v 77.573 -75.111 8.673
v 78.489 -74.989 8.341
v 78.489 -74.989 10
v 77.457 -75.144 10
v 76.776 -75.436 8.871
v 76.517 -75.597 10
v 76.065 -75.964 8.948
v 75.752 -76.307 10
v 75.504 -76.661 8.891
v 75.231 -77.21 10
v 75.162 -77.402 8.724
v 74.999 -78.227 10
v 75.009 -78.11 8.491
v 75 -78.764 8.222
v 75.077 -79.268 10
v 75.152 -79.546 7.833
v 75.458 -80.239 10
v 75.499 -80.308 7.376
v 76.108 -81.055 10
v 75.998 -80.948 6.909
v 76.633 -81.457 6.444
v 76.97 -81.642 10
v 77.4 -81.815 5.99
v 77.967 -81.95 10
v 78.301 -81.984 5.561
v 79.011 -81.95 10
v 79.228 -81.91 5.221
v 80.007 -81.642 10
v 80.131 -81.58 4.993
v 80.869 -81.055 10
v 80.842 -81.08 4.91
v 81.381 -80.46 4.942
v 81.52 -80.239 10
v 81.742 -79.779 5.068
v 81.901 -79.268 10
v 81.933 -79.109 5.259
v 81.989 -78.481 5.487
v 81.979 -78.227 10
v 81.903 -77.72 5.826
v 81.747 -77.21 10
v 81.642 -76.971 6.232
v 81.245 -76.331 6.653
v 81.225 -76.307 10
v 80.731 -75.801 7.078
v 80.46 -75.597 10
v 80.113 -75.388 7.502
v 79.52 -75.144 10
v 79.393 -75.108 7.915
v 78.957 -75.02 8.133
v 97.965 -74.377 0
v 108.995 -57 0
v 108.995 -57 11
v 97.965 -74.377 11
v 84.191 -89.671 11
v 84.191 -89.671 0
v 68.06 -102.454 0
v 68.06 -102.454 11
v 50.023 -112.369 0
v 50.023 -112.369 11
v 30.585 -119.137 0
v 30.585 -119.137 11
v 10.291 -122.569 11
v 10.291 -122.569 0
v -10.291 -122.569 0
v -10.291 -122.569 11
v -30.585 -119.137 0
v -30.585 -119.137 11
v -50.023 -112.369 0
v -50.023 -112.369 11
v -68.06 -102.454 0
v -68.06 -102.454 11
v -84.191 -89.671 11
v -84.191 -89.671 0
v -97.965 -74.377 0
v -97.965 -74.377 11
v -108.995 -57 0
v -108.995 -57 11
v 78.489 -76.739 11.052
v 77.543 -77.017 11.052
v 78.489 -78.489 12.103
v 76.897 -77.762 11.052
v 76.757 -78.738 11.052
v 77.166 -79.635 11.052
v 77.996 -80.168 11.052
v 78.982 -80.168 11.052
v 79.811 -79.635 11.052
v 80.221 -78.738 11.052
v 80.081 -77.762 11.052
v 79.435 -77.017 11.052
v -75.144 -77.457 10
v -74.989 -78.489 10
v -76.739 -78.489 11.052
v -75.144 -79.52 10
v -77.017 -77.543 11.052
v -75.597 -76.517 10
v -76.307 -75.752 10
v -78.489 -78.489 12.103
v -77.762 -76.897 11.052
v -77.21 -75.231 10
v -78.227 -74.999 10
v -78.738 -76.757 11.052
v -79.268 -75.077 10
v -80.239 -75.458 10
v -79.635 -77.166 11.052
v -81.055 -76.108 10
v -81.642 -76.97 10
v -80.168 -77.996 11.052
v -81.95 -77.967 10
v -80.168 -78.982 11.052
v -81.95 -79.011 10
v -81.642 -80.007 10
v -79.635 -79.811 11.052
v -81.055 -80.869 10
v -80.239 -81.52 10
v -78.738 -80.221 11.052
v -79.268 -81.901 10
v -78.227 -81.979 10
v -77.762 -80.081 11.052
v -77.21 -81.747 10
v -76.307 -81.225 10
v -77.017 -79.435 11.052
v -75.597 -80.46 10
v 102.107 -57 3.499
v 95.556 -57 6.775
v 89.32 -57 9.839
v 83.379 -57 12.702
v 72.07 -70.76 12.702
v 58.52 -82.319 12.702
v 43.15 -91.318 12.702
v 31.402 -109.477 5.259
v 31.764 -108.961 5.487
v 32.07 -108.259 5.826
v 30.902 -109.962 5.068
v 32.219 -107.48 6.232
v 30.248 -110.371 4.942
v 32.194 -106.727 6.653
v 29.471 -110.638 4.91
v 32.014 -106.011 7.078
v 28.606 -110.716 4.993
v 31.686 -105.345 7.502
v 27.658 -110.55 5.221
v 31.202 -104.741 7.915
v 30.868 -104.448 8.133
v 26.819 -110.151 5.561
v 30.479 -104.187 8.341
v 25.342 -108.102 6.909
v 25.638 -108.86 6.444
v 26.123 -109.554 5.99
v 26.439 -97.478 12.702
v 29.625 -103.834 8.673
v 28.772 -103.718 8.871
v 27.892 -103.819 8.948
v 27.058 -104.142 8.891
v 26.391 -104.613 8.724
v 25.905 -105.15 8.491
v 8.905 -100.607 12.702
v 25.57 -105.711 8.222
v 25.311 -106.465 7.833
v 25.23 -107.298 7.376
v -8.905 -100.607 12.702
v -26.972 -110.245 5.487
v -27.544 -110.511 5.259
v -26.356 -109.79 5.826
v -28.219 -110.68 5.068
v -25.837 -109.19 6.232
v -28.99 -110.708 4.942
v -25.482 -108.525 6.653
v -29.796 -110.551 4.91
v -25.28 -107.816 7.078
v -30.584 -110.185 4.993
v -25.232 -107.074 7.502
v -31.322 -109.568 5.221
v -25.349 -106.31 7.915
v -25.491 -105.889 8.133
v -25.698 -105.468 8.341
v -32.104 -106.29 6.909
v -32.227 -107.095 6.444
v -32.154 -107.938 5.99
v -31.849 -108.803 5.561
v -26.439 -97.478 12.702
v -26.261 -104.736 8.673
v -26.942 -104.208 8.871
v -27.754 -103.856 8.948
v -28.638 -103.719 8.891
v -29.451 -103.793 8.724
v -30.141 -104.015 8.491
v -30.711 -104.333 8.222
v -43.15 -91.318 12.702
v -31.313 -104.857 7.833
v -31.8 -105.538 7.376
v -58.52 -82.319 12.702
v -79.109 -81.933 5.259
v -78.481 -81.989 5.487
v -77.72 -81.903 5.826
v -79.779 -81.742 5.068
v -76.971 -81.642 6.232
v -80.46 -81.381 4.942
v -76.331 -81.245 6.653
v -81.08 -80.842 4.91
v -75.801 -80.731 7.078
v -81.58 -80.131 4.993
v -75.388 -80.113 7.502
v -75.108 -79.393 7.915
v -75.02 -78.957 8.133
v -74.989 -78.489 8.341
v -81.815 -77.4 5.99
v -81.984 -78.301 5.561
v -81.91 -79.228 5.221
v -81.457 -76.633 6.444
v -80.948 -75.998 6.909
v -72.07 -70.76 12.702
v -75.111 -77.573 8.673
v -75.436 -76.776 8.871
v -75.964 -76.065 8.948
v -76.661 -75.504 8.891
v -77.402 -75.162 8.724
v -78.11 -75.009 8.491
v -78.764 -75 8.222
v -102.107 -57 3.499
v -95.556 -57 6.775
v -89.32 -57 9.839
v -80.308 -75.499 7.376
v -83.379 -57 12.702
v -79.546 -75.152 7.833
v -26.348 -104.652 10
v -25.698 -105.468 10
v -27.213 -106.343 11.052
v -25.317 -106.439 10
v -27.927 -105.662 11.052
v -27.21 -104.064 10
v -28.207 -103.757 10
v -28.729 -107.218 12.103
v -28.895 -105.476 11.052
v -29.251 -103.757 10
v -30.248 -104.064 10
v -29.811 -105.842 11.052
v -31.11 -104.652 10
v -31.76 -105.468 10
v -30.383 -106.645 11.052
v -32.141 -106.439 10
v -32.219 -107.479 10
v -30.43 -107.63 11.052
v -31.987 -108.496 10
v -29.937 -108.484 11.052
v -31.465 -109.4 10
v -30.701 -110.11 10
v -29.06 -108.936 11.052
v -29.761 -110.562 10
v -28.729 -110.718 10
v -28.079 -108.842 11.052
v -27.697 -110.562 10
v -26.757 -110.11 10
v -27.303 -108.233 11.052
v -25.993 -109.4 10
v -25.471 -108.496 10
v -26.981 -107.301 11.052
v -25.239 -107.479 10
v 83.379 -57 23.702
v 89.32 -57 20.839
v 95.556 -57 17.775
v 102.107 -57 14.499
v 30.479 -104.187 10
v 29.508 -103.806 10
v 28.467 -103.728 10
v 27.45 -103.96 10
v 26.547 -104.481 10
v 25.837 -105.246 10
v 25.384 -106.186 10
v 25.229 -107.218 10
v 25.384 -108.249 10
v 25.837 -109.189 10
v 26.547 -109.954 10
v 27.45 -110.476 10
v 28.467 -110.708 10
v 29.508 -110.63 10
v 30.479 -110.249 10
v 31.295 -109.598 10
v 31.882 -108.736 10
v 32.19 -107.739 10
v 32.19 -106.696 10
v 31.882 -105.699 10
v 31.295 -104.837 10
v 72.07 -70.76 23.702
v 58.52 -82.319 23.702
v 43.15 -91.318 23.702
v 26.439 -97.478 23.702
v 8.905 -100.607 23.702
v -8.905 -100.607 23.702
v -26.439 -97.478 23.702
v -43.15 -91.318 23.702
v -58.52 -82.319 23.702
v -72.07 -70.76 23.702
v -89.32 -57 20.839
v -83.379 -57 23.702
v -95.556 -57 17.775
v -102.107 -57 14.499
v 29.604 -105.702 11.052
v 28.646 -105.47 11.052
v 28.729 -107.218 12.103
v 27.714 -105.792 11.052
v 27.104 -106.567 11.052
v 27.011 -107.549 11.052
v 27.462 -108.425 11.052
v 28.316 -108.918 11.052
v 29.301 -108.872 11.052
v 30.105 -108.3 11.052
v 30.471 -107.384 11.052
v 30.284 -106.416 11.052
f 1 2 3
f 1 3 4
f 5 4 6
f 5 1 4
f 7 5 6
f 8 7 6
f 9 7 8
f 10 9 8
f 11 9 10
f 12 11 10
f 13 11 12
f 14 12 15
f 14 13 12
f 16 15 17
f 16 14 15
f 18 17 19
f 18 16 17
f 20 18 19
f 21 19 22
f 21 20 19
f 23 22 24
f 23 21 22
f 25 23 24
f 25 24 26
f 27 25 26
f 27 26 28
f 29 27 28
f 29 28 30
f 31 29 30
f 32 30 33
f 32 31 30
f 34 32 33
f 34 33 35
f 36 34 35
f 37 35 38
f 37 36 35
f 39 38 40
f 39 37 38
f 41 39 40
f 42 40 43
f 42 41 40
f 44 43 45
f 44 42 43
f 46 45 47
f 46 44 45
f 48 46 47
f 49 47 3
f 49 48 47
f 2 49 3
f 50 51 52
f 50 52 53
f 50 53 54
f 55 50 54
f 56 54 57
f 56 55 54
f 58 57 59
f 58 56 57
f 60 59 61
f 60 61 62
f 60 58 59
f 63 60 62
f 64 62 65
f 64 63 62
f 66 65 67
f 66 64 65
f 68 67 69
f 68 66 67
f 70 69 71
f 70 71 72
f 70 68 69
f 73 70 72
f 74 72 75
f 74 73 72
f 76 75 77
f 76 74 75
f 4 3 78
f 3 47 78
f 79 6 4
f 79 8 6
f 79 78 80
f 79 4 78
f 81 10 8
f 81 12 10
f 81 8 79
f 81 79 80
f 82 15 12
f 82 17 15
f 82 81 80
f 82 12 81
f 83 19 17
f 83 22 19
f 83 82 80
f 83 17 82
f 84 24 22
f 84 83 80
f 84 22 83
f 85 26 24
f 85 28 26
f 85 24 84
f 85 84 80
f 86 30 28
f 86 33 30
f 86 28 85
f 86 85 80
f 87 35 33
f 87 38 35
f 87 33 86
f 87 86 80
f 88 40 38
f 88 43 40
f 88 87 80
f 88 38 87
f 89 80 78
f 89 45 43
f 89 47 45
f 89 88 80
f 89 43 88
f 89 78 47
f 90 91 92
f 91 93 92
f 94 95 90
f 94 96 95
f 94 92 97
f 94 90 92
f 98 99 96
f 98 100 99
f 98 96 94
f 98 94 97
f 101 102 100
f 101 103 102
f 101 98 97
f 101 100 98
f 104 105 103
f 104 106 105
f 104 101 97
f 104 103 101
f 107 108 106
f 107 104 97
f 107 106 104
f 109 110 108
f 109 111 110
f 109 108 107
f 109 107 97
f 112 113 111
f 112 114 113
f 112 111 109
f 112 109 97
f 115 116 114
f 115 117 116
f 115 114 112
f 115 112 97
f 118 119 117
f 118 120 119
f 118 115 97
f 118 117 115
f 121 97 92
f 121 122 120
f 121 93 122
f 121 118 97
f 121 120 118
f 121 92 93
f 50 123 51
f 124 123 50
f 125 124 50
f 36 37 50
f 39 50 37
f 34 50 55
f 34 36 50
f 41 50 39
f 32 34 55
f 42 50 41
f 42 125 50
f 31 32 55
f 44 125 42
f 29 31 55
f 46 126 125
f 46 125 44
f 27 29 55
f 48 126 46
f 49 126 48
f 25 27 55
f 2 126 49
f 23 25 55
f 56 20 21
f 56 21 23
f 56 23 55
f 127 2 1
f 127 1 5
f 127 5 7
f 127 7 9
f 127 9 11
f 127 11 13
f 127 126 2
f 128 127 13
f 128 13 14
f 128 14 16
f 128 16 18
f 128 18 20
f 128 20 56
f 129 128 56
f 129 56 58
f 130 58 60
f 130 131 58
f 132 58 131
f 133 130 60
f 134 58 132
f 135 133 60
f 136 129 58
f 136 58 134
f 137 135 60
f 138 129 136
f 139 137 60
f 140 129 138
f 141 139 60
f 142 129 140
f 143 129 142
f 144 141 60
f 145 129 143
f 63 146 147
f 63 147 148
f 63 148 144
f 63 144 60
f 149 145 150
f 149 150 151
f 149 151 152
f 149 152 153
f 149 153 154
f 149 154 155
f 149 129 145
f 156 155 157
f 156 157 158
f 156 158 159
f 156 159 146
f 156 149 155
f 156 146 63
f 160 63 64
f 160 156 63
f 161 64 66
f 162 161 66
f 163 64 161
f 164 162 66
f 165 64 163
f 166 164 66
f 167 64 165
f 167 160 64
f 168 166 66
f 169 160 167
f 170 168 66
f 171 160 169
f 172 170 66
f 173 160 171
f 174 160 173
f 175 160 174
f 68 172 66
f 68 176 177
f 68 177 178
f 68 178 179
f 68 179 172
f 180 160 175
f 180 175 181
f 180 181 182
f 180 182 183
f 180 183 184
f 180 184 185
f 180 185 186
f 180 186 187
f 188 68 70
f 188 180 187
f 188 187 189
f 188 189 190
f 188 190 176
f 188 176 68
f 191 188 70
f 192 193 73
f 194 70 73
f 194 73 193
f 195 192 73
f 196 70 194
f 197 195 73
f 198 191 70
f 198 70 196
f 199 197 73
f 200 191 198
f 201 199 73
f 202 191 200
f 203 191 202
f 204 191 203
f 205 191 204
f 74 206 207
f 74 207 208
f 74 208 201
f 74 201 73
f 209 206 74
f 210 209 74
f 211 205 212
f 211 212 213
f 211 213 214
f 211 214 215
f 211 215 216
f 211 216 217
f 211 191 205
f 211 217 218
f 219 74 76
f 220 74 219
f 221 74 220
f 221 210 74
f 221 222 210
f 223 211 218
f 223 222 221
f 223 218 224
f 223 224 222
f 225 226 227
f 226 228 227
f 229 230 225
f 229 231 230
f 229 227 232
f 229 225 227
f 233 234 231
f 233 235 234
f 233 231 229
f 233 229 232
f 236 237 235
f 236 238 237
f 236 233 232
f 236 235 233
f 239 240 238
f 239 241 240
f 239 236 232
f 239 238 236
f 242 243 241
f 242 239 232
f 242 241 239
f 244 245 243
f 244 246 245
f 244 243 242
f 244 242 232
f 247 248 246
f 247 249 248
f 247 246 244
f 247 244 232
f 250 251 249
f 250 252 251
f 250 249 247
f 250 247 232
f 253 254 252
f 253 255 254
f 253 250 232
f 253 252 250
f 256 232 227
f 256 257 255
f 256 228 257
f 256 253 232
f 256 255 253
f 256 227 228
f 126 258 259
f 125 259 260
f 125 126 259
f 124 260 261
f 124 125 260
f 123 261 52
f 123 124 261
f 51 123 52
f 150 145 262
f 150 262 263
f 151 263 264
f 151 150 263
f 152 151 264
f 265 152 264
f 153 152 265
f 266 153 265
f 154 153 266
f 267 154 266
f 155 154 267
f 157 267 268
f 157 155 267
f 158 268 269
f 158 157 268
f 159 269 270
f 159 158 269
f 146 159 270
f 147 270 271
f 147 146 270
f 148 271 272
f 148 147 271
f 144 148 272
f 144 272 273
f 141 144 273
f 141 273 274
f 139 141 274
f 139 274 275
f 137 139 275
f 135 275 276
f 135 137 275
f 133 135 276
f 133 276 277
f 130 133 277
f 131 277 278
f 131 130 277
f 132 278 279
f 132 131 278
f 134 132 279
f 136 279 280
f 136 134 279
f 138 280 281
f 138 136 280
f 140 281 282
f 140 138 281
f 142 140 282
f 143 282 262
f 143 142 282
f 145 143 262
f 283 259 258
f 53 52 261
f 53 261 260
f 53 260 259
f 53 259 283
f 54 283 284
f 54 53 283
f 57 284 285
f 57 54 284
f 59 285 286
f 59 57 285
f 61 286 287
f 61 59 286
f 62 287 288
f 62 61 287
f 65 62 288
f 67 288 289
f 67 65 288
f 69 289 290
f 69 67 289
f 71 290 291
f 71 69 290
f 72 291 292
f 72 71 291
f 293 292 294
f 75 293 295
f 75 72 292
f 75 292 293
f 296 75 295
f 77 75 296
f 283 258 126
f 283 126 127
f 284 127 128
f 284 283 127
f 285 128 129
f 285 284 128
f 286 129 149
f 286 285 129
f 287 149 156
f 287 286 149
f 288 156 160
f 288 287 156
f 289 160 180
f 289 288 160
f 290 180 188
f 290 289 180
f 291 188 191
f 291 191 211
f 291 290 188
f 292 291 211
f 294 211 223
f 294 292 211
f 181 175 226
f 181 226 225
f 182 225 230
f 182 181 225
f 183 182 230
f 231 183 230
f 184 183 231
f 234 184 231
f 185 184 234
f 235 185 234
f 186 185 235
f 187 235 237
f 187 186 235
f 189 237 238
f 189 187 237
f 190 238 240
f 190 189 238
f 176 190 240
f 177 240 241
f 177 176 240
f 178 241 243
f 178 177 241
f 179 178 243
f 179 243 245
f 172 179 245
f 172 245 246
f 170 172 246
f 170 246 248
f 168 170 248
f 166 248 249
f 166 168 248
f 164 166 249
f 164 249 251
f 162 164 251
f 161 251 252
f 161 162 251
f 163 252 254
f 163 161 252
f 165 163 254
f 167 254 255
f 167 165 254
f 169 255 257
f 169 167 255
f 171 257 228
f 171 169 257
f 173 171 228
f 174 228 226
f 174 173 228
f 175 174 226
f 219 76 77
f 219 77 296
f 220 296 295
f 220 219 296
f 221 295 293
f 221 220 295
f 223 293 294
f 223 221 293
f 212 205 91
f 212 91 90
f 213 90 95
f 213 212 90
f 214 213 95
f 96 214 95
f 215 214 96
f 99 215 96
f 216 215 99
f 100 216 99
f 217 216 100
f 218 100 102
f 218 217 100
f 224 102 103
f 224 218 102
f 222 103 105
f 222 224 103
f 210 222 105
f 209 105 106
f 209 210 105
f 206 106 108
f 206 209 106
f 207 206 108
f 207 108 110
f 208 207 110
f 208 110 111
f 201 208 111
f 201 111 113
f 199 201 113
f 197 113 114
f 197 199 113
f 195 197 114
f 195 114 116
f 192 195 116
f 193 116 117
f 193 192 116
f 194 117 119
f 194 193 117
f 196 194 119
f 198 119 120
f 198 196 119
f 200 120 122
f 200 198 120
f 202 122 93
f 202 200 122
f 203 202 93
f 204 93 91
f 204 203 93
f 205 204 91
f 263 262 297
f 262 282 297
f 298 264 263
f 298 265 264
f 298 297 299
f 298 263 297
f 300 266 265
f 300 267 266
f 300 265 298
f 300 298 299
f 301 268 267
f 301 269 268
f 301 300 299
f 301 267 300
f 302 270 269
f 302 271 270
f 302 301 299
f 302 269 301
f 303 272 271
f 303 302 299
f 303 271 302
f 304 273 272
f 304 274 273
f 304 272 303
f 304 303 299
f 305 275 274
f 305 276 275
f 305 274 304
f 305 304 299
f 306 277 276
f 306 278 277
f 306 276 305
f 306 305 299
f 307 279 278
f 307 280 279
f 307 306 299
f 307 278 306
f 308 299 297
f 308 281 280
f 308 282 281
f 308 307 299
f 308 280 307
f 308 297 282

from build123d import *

# Parameters (mm, degrees)
CUT_EXTRUDE_1_DEPTH      = 176.555606187
CUT_EXTRUDE_1_DEPTH_BACK = 176.555606187
PATTERN_CIRCULAR_1_COUNT = 4
PATTERN_CIRCULAR_1_ANGLE = 90


with BuildPart() as part:
    # 草图1 → 旋转1 (revolve)
    with BuildSketch(Plane(origin=(0, 0, 0), x_dir=(0, 0, -1), z_dir=(1, 0, 0)), mode=Mode.PRIVATE) as revolve_1_sk:
        Polygon((-11, -123), (0, -123), (-12.701705922, -101), (-23.701705922, -101), align=None)
    revolve(revolve_1_sk.sketch.rotate(Axis((0, 0, 0), (0, 0, -1)), 270), axis=Axis((0, 0, 0), (0, 0, -1)))

    # 草图2 → 切除-拉伸1 (cut, two sides: drawn at the far end of the back side and taken through both)
    with BuildSketch(Plane.XY.offset(-CUT_EXTRUDE_1_DEPTH_BACK)):
        Polygon((-891.013215652, -57), (-178.582733939, -57), (163.038782242, -57), (875.469263955, -57), (875.469263955, 1367.860963427), (-891.013215652, 1367.860963427), align=None)
    extrude(amount=CUT_EXTRUDE_1_DEPTH + CUT_EXTRUDE_1_DEPTH_BACK, mode=Mode.SUBTRACT)

    # 草图4 → Ø7.0 (7) 直径孔1 (revolve, cut)
    with BuildSketch(Plane(origin=(78.488852712, -78.488852712, 0), x_dir=(0, 1, 0), z_dir=(1, 0, 0))):
        Polygon((0, 0), (0, 12.103012167), (3.5, 10), (3.5, 0), align=None)
    hole_wizard_7_0_7_1 = revolve(axis=Axis((78.488852712, -78.488852712, -6.35), (0, 0, 1)), mode=Mode.SUBTRACT)

    # 阵列(圆周)1: Ø7.0 (7) 直径孔1 ×4 about axis
    pattern_circular_1_axis = Axis((0, 0, 0), (0, 0, -1))
    for i in range(1, PATTERN_CIRCULAR_1_COUNT):
        add(hole_wizard_7_0_7_1.rotate(pattern_circular_1_axis, i * PATTERN_CIRCULAR_1_ANGLE / (PATTERN_CIRCULAR_1_COUNT - 1)), mode=Mode.SUBTRACT)


solid = part.part
